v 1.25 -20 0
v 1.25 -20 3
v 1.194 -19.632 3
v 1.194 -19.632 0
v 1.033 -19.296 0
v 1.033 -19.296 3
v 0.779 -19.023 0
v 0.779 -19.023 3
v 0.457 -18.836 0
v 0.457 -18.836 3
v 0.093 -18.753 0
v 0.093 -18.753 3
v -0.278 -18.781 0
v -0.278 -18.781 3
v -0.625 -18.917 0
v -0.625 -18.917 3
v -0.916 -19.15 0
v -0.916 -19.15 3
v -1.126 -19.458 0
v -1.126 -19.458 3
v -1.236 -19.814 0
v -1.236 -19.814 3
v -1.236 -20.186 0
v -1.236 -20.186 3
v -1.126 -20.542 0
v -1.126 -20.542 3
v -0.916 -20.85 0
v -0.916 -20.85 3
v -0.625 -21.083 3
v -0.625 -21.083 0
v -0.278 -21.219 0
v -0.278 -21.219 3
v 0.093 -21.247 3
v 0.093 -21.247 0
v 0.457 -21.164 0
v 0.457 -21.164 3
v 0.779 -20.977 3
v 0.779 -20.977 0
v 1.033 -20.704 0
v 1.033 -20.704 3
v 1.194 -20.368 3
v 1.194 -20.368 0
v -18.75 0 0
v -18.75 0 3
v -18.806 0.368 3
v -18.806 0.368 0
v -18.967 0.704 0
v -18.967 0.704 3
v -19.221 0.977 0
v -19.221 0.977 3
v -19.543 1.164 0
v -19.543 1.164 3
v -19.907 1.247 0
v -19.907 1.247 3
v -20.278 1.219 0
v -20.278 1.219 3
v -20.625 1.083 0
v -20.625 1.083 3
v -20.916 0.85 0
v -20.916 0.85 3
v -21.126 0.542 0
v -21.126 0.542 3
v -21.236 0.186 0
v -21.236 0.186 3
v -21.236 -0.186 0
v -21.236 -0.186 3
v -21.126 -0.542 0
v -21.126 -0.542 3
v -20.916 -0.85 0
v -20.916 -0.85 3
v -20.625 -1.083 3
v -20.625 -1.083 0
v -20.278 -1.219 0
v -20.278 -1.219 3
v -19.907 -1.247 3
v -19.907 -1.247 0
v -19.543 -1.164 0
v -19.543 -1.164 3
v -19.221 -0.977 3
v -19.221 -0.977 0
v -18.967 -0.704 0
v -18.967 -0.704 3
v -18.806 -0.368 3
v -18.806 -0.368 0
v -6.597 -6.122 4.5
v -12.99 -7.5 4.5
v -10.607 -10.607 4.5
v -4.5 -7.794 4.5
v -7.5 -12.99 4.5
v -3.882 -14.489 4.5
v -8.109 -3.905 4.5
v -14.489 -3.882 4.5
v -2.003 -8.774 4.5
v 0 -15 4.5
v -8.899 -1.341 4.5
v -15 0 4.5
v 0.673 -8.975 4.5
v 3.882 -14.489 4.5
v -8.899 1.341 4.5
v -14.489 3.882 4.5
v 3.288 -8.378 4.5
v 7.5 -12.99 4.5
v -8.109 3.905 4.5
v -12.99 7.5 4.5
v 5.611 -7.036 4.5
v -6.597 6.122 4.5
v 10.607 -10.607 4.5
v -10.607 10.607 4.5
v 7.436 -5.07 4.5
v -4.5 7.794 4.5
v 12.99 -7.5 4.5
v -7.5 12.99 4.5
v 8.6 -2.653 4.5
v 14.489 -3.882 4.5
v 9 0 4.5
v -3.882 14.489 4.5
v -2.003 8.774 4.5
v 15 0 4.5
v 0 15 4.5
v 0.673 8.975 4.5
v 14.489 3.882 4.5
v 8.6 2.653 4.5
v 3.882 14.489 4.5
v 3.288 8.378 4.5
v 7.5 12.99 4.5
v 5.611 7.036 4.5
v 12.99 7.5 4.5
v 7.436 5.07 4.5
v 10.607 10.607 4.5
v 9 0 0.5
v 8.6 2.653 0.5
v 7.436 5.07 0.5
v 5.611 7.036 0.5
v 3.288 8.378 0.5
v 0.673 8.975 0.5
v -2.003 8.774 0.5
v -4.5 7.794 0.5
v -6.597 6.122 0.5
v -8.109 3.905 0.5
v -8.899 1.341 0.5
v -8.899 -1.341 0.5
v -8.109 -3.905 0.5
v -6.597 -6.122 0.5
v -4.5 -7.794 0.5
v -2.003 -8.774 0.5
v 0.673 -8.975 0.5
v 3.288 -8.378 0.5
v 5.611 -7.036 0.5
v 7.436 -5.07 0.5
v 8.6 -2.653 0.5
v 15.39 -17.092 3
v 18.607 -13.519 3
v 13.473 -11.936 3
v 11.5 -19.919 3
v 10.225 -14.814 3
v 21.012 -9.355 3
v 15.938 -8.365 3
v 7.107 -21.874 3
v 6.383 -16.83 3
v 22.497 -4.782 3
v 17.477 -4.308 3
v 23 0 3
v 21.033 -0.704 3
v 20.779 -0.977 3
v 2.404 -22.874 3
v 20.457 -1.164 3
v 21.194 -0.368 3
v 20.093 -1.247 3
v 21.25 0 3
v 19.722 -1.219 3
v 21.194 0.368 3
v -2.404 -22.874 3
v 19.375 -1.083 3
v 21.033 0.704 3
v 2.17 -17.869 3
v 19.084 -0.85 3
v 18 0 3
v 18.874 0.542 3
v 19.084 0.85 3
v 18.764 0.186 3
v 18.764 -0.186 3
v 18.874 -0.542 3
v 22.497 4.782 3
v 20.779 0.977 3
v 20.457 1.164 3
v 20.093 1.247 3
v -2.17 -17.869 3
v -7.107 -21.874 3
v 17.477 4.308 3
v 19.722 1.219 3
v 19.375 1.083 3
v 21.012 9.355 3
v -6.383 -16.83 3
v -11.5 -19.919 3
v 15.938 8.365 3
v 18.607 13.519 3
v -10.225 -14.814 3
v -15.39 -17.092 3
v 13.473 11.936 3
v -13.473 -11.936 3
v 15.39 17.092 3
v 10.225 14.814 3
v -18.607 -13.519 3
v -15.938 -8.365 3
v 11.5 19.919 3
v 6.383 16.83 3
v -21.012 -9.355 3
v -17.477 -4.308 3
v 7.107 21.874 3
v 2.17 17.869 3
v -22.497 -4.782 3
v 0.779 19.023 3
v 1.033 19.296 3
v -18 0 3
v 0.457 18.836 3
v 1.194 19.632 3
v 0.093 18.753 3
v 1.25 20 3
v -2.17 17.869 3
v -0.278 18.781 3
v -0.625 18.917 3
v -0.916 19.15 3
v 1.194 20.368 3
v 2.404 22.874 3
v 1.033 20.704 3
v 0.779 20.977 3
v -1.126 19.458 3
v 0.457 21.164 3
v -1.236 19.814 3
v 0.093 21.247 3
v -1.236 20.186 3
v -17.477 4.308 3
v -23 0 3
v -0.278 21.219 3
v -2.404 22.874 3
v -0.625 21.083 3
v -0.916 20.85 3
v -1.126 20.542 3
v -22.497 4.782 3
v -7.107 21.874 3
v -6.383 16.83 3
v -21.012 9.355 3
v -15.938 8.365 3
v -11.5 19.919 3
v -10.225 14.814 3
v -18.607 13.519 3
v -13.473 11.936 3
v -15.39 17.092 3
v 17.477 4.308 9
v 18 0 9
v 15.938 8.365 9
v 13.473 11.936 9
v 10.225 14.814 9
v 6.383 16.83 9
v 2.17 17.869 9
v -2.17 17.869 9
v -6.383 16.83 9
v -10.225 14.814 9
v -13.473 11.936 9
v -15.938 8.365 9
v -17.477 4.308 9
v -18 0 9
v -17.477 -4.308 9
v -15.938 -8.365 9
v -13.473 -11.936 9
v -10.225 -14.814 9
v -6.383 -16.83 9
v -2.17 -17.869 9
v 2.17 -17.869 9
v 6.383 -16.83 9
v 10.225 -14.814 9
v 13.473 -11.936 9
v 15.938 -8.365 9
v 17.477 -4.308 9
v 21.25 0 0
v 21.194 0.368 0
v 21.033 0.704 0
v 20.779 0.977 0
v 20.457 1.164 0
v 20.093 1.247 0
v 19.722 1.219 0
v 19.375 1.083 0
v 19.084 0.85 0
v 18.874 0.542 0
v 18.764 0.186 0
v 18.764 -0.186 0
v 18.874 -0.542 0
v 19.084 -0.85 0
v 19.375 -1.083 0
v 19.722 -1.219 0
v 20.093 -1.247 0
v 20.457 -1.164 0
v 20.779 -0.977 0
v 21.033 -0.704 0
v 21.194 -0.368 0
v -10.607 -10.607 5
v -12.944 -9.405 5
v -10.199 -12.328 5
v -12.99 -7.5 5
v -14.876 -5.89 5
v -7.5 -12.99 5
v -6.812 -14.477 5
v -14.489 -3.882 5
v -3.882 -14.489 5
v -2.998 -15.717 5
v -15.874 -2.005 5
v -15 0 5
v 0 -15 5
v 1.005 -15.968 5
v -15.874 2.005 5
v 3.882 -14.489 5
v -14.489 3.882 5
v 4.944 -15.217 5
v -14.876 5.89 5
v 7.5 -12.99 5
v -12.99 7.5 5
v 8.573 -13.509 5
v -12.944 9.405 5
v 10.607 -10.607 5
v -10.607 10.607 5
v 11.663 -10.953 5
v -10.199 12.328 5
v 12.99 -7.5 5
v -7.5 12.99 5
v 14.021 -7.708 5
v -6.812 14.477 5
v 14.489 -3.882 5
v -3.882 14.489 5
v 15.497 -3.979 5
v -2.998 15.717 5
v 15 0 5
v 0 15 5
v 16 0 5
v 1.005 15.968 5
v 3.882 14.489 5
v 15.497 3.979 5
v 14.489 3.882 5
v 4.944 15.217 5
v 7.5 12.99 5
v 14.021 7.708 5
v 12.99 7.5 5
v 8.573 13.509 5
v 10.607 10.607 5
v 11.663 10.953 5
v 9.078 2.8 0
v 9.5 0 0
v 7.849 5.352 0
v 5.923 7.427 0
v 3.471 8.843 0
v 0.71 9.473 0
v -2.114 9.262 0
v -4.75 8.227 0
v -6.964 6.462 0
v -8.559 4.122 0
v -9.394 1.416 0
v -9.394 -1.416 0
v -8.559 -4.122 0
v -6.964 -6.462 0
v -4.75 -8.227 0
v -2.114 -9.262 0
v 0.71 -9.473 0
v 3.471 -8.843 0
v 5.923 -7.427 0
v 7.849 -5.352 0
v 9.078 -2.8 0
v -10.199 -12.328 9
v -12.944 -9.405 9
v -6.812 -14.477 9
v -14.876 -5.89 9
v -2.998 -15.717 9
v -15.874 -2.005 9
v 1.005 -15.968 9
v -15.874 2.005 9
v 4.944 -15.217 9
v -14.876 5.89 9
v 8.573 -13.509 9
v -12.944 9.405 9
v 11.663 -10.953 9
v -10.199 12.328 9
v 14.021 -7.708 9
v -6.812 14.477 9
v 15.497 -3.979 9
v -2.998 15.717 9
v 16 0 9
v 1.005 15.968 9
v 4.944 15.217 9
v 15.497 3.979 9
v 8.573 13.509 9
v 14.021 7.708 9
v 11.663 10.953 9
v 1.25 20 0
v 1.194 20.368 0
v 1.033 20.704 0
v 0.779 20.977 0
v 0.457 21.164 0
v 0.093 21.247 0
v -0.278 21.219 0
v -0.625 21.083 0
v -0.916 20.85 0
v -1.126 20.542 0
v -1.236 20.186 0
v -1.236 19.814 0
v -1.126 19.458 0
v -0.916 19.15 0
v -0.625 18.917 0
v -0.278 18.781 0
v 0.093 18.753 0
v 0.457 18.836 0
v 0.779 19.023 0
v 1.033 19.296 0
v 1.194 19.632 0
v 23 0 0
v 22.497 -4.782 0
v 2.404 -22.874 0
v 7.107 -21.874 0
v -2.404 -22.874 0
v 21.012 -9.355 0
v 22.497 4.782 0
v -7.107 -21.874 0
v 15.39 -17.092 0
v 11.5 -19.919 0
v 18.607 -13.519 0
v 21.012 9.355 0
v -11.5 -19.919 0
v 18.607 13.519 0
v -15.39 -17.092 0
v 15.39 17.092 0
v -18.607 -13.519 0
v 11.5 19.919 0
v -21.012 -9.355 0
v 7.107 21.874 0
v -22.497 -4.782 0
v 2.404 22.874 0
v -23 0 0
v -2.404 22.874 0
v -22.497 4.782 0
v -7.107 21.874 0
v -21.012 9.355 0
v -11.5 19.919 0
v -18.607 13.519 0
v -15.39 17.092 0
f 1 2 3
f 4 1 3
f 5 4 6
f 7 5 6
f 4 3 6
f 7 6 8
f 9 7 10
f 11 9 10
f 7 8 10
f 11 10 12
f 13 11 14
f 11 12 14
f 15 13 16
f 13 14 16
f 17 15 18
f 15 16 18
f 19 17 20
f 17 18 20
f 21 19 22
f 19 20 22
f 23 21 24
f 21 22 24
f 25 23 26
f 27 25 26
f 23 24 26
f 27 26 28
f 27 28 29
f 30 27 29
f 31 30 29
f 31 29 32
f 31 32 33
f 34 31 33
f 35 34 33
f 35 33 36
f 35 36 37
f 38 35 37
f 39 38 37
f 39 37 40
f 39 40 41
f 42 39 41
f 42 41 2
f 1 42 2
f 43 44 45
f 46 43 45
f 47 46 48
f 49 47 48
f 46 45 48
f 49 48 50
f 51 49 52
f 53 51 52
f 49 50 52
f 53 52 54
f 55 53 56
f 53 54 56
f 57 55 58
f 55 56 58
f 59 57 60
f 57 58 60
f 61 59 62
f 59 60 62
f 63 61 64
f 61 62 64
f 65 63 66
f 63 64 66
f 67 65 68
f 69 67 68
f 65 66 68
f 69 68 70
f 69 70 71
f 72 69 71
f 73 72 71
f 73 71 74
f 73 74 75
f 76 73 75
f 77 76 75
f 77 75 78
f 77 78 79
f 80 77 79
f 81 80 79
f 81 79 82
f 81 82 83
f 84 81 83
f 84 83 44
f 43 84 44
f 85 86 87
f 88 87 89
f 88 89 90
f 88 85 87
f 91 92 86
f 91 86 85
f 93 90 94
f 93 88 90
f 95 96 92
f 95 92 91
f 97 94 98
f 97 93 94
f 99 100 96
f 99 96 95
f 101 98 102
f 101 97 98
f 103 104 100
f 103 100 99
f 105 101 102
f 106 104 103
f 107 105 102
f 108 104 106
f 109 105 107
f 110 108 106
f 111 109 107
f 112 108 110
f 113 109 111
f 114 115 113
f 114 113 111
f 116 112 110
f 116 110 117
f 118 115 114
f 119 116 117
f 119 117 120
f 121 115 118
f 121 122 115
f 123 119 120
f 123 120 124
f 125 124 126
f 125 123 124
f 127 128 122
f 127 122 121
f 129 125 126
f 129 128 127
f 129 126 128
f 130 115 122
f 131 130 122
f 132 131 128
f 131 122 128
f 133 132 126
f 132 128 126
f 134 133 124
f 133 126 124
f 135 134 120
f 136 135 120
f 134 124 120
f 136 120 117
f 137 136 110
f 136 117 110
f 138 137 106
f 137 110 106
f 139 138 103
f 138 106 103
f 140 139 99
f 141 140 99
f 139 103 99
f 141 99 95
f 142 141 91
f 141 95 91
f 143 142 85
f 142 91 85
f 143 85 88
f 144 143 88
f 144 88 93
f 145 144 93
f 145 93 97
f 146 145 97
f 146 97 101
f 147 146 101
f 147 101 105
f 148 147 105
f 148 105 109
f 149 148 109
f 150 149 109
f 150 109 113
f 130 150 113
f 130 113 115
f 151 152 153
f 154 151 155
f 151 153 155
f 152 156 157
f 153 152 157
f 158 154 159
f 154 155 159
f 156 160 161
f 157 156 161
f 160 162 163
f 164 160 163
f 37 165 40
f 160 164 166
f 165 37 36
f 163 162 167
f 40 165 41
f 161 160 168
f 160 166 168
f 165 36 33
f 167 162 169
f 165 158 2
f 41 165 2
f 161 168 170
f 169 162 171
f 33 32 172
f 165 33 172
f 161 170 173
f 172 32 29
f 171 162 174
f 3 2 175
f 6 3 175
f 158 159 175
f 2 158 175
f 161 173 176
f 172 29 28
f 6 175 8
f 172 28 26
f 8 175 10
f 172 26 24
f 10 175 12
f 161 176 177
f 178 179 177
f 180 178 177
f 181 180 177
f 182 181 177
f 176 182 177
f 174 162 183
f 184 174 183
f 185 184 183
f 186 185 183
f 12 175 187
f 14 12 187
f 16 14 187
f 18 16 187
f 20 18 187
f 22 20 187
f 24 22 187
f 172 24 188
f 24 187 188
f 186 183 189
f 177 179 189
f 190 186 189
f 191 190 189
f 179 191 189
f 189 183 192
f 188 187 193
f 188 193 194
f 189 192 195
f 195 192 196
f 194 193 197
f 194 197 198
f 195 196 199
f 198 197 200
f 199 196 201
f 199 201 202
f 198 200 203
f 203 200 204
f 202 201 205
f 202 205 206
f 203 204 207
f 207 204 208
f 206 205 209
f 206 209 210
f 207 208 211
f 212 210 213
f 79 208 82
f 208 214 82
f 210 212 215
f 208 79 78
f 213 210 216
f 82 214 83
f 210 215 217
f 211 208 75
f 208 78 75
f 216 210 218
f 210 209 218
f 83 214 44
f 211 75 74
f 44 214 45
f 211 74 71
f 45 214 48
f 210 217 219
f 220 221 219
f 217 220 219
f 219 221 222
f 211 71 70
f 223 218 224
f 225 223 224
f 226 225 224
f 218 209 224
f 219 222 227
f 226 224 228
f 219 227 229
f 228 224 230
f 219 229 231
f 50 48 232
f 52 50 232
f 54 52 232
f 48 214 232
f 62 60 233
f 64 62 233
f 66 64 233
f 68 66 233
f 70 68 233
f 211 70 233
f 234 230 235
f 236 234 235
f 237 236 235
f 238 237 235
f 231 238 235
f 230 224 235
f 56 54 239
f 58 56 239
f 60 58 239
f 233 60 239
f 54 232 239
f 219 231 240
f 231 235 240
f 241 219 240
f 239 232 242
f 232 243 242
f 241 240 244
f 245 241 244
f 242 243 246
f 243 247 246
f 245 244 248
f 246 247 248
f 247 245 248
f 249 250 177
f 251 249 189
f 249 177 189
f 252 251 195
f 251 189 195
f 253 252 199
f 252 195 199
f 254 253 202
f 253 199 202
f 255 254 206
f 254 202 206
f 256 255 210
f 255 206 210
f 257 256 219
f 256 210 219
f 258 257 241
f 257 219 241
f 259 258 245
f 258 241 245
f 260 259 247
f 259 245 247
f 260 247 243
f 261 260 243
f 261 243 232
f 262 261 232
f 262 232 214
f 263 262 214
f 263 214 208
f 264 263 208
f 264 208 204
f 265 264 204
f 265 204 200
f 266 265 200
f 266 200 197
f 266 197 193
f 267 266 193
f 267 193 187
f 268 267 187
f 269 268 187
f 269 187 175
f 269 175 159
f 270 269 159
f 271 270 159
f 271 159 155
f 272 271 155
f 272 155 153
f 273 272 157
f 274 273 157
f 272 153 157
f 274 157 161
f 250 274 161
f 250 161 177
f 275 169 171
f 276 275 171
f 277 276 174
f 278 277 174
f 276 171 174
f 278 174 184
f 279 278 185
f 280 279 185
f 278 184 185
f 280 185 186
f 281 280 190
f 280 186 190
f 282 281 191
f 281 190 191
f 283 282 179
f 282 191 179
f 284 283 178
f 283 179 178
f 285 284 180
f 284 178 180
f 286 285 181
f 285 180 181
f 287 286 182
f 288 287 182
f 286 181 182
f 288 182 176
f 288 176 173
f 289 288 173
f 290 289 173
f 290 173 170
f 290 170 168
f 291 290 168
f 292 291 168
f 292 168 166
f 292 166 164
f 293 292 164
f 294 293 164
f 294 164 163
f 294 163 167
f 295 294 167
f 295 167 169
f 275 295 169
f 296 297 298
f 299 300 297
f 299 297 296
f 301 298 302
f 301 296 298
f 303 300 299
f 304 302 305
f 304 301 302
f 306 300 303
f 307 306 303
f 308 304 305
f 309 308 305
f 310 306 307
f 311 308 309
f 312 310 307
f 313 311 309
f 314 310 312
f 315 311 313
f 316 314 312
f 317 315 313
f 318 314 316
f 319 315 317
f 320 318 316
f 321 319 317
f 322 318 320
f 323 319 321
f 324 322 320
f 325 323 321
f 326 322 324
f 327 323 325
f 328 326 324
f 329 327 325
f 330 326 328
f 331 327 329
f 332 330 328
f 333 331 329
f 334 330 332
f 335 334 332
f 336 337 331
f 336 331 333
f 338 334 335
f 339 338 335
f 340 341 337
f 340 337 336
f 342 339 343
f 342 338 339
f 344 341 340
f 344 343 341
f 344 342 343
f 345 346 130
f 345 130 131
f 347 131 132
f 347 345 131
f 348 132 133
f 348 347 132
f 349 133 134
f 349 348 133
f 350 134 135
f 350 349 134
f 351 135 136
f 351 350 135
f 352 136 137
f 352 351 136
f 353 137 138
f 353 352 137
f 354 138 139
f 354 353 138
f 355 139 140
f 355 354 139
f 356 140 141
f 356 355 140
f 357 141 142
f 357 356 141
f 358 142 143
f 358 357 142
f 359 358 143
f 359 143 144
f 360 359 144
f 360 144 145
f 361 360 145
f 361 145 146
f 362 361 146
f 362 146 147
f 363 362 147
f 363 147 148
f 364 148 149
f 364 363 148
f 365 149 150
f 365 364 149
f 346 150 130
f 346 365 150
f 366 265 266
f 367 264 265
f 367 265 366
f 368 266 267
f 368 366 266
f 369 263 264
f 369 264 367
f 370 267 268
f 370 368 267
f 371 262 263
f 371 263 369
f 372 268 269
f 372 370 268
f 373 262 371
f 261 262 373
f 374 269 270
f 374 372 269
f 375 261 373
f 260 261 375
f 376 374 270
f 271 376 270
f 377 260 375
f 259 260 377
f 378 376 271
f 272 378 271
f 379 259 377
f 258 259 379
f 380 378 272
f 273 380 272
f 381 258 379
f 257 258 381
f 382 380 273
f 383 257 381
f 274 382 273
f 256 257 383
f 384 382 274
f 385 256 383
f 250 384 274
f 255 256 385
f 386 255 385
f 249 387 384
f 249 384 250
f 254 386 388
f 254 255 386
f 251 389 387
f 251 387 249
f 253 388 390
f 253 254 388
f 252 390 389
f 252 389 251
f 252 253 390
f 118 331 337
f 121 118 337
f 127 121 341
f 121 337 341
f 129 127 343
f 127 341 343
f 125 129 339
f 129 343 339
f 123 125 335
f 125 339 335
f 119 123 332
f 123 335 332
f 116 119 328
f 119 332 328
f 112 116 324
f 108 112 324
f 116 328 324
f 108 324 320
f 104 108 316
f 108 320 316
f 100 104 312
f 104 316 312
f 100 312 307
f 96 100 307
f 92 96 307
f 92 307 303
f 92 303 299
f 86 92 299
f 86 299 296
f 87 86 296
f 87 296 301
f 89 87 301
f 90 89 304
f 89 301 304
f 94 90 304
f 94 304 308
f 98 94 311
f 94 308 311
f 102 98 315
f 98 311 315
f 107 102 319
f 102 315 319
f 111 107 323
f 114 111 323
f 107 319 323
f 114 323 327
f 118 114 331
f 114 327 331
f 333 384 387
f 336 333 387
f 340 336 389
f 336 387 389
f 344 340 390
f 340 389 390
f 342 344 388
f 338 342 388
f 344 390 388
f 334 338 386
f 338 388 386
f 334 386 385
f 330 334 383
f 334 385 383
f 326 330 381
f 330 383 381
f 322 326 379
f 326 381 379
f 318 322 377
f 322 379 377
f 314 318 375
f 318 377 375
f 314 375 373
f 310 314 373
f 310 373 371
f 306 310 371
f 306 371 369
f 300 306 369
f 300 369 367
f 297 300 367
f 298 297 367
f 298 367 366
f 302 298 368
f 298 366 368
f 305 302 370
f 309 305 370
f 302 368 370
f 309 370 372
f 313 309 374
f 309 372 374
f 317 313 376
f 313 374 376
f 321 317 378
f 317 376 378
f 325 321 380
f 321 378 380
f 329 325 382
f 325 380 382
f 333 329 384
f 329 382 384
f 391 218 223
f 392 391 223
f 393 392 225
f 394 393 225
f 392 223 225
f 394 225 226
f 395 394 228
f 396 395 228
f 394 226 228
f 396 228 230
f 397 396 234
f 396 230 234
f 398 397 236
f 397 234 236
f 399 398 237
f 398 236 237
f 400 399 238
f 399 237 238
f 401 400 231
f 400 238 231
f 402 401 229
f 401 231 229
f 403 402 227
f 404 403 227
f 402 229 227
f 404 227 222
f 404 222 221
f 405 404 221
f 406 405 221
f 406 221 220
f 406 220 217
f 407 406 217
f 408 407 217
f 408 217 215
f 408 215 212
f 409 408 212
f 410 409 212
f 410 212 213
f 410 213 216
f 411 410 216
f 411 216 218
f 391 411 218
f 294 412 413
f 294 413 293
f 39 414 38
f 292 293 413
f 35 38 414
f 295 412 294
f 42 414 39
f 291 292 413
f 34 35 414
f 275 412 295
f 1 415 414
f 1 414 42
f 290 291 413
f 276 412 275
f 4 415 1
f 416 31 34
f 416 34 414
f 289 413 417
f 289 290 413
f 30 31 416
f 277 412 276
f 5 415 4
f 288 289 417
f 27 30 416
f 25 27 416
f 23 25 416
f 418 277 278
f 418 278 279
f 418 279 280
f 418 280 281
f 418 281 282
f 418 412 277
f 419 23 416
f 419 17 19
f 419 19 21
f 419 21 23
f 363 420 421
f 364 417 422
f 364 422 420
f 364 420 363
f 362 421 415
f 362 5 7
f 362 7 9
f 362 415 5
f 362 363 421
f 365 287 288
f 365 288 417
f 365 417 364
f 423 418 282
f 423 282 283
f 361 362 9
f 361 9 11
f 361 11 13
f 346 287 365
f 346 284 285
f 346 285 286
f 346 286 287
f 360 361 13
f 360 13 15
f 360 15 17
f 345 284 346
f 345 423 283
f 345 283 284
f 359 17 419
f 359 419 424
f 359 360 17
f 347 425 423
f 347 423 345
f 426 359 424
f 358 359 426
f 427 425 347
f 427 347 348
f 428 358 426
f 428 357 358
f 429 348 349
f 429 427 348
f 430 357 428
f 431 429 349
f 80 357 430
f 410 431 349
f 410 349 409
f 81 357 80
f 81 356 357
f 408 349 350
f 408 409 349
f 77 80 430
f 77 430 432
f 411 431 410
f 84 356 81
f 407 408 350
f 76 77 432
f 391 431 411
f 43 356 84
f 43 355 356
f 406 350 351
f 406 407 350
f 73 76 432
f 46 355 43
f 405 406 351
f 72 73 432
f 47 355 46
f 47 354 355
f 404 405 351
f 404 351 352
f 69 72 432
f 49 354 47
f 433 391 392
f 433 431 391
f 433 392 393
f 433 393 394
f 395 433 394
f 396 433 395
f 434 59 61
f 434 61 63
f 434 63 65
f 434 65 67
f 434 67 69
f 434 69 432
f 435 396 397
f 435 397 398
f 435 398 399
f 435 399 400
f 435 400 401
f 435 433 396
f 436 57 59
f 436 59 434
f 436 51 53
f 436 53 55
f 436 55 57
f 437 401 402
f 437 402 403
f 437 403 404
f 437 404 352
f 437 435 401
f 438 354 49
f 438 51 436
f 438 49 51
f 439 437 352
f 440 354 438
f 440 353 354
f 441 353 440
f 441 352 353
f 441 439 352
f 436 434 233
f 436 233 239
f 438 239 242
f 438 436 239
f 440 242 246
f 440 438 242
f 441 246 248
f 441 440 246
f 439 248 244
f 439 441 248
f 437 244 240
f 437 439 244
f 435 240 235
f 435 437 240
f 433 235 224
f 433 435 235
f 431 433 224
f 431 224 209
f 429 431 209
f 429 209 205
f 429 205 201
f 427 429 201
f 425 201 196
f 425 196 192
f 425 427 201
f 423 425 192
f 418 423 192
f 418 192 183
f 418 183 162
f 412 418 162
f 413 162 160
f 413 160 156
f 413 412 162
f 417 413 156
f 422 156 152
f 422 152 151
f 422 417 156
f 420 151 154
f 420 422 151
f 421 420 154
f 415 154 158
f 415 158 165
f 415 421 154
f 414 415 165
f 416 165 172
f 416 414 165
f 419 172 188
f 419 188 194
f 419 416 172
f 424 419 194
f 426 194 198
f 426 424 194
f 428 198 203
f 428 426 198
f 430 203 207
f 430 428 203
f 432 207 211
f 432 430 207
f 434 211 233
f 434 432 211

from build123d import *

# Parameters (mm, degrees)
SKETCH_1_R          = 18
EXTRUDE_3_DEPTH     = 9
SKETCH_4_R          = 16
CUT_EXTRUDE_1_DEPTH = 4
SKETCH_5_R          = 15
CUT_EXTRUDE_2_DEPTH = 0.5
SKETCH_7_R          = 9
CUT_EXTRUDE_3_DEPTH = 26.850531909
SKETCH_11_R         = 23
SKETCH_11_R_2       = 18
EXTRUDE_4_DEPTH     = 3
CHAMFER_2_SIZE      = 0.5
HOLE_WIZARD_M3_2_D  = 2.5


with BuildPart() as part:
    # 草图1 → 凸台-拉伸3 (new body)
    with BuildSketch(Plane.XY):
        Circle(SKETCH_1_R)
    extrude(amount=EXTRUDE_3_DEPTH)

    # 草图4 → 切除-拉伸1 (cut)
    with BuildSketch(Plane.XY.offset(9)):
        Circle(SKETCH_4_R)
    extrude(amount=-CUT_EXTRUDE_1_DEPTH, mode=Mode.SUBTRACT)

    # 草图5 → 切除-拉伸2 (cut)
    with BuildSketch(Plane.XY.offset(5)):
        Circle(SKETCH_5_R)
    extrude(amount=-CUT_EXTRUDE_2_DEPTH, mode=Mode.SUBTRACT)

    # 草图7 → 切除-拉伸3 (cut, through all)
    with BuildSketch(Plane.XY.offset(4.5)):
        Circle(SKETCH_7_R)
    extrude(amount=-CUT_EXTRUDE_3_DEPTH, mode=Mode.SUBTRACT)

    # 草图11 → 凸台-拉伸4 (add)
    with BuildSketch(Plane(origin=(0, 0, 0), x_dir=(-1, 0, 0), z_dir=(0, 0, -1))):
        Circle(SKETCH_11_R)
        Circle(SKETCH_11_R_2, mode=Mode.SUBTRACT)
    extrude(amount=-EXTRUDE_4_DEPTH)

    # 倒角2
    chamfer_2_edges = [part.edges().sort_by_distance(p)[0] for p in [
        (-9, 0, 0),
    ]]
    chamfer(chamfer_2_edges, length=CHAMFER_2_SIZE)

    # M3 螺纹孔2 (through all)
    with Locations(Plane(origin=(0, 0, 0), x_dir=(-1, 0, 0), z_dir=(0, 0, -1))):
        with Locations((0, 20), (-20, 0), (0, -20), (20, 0)):
            Hole(HOLE_WIZARD_M3_2_D / 2)


solid = part.part
